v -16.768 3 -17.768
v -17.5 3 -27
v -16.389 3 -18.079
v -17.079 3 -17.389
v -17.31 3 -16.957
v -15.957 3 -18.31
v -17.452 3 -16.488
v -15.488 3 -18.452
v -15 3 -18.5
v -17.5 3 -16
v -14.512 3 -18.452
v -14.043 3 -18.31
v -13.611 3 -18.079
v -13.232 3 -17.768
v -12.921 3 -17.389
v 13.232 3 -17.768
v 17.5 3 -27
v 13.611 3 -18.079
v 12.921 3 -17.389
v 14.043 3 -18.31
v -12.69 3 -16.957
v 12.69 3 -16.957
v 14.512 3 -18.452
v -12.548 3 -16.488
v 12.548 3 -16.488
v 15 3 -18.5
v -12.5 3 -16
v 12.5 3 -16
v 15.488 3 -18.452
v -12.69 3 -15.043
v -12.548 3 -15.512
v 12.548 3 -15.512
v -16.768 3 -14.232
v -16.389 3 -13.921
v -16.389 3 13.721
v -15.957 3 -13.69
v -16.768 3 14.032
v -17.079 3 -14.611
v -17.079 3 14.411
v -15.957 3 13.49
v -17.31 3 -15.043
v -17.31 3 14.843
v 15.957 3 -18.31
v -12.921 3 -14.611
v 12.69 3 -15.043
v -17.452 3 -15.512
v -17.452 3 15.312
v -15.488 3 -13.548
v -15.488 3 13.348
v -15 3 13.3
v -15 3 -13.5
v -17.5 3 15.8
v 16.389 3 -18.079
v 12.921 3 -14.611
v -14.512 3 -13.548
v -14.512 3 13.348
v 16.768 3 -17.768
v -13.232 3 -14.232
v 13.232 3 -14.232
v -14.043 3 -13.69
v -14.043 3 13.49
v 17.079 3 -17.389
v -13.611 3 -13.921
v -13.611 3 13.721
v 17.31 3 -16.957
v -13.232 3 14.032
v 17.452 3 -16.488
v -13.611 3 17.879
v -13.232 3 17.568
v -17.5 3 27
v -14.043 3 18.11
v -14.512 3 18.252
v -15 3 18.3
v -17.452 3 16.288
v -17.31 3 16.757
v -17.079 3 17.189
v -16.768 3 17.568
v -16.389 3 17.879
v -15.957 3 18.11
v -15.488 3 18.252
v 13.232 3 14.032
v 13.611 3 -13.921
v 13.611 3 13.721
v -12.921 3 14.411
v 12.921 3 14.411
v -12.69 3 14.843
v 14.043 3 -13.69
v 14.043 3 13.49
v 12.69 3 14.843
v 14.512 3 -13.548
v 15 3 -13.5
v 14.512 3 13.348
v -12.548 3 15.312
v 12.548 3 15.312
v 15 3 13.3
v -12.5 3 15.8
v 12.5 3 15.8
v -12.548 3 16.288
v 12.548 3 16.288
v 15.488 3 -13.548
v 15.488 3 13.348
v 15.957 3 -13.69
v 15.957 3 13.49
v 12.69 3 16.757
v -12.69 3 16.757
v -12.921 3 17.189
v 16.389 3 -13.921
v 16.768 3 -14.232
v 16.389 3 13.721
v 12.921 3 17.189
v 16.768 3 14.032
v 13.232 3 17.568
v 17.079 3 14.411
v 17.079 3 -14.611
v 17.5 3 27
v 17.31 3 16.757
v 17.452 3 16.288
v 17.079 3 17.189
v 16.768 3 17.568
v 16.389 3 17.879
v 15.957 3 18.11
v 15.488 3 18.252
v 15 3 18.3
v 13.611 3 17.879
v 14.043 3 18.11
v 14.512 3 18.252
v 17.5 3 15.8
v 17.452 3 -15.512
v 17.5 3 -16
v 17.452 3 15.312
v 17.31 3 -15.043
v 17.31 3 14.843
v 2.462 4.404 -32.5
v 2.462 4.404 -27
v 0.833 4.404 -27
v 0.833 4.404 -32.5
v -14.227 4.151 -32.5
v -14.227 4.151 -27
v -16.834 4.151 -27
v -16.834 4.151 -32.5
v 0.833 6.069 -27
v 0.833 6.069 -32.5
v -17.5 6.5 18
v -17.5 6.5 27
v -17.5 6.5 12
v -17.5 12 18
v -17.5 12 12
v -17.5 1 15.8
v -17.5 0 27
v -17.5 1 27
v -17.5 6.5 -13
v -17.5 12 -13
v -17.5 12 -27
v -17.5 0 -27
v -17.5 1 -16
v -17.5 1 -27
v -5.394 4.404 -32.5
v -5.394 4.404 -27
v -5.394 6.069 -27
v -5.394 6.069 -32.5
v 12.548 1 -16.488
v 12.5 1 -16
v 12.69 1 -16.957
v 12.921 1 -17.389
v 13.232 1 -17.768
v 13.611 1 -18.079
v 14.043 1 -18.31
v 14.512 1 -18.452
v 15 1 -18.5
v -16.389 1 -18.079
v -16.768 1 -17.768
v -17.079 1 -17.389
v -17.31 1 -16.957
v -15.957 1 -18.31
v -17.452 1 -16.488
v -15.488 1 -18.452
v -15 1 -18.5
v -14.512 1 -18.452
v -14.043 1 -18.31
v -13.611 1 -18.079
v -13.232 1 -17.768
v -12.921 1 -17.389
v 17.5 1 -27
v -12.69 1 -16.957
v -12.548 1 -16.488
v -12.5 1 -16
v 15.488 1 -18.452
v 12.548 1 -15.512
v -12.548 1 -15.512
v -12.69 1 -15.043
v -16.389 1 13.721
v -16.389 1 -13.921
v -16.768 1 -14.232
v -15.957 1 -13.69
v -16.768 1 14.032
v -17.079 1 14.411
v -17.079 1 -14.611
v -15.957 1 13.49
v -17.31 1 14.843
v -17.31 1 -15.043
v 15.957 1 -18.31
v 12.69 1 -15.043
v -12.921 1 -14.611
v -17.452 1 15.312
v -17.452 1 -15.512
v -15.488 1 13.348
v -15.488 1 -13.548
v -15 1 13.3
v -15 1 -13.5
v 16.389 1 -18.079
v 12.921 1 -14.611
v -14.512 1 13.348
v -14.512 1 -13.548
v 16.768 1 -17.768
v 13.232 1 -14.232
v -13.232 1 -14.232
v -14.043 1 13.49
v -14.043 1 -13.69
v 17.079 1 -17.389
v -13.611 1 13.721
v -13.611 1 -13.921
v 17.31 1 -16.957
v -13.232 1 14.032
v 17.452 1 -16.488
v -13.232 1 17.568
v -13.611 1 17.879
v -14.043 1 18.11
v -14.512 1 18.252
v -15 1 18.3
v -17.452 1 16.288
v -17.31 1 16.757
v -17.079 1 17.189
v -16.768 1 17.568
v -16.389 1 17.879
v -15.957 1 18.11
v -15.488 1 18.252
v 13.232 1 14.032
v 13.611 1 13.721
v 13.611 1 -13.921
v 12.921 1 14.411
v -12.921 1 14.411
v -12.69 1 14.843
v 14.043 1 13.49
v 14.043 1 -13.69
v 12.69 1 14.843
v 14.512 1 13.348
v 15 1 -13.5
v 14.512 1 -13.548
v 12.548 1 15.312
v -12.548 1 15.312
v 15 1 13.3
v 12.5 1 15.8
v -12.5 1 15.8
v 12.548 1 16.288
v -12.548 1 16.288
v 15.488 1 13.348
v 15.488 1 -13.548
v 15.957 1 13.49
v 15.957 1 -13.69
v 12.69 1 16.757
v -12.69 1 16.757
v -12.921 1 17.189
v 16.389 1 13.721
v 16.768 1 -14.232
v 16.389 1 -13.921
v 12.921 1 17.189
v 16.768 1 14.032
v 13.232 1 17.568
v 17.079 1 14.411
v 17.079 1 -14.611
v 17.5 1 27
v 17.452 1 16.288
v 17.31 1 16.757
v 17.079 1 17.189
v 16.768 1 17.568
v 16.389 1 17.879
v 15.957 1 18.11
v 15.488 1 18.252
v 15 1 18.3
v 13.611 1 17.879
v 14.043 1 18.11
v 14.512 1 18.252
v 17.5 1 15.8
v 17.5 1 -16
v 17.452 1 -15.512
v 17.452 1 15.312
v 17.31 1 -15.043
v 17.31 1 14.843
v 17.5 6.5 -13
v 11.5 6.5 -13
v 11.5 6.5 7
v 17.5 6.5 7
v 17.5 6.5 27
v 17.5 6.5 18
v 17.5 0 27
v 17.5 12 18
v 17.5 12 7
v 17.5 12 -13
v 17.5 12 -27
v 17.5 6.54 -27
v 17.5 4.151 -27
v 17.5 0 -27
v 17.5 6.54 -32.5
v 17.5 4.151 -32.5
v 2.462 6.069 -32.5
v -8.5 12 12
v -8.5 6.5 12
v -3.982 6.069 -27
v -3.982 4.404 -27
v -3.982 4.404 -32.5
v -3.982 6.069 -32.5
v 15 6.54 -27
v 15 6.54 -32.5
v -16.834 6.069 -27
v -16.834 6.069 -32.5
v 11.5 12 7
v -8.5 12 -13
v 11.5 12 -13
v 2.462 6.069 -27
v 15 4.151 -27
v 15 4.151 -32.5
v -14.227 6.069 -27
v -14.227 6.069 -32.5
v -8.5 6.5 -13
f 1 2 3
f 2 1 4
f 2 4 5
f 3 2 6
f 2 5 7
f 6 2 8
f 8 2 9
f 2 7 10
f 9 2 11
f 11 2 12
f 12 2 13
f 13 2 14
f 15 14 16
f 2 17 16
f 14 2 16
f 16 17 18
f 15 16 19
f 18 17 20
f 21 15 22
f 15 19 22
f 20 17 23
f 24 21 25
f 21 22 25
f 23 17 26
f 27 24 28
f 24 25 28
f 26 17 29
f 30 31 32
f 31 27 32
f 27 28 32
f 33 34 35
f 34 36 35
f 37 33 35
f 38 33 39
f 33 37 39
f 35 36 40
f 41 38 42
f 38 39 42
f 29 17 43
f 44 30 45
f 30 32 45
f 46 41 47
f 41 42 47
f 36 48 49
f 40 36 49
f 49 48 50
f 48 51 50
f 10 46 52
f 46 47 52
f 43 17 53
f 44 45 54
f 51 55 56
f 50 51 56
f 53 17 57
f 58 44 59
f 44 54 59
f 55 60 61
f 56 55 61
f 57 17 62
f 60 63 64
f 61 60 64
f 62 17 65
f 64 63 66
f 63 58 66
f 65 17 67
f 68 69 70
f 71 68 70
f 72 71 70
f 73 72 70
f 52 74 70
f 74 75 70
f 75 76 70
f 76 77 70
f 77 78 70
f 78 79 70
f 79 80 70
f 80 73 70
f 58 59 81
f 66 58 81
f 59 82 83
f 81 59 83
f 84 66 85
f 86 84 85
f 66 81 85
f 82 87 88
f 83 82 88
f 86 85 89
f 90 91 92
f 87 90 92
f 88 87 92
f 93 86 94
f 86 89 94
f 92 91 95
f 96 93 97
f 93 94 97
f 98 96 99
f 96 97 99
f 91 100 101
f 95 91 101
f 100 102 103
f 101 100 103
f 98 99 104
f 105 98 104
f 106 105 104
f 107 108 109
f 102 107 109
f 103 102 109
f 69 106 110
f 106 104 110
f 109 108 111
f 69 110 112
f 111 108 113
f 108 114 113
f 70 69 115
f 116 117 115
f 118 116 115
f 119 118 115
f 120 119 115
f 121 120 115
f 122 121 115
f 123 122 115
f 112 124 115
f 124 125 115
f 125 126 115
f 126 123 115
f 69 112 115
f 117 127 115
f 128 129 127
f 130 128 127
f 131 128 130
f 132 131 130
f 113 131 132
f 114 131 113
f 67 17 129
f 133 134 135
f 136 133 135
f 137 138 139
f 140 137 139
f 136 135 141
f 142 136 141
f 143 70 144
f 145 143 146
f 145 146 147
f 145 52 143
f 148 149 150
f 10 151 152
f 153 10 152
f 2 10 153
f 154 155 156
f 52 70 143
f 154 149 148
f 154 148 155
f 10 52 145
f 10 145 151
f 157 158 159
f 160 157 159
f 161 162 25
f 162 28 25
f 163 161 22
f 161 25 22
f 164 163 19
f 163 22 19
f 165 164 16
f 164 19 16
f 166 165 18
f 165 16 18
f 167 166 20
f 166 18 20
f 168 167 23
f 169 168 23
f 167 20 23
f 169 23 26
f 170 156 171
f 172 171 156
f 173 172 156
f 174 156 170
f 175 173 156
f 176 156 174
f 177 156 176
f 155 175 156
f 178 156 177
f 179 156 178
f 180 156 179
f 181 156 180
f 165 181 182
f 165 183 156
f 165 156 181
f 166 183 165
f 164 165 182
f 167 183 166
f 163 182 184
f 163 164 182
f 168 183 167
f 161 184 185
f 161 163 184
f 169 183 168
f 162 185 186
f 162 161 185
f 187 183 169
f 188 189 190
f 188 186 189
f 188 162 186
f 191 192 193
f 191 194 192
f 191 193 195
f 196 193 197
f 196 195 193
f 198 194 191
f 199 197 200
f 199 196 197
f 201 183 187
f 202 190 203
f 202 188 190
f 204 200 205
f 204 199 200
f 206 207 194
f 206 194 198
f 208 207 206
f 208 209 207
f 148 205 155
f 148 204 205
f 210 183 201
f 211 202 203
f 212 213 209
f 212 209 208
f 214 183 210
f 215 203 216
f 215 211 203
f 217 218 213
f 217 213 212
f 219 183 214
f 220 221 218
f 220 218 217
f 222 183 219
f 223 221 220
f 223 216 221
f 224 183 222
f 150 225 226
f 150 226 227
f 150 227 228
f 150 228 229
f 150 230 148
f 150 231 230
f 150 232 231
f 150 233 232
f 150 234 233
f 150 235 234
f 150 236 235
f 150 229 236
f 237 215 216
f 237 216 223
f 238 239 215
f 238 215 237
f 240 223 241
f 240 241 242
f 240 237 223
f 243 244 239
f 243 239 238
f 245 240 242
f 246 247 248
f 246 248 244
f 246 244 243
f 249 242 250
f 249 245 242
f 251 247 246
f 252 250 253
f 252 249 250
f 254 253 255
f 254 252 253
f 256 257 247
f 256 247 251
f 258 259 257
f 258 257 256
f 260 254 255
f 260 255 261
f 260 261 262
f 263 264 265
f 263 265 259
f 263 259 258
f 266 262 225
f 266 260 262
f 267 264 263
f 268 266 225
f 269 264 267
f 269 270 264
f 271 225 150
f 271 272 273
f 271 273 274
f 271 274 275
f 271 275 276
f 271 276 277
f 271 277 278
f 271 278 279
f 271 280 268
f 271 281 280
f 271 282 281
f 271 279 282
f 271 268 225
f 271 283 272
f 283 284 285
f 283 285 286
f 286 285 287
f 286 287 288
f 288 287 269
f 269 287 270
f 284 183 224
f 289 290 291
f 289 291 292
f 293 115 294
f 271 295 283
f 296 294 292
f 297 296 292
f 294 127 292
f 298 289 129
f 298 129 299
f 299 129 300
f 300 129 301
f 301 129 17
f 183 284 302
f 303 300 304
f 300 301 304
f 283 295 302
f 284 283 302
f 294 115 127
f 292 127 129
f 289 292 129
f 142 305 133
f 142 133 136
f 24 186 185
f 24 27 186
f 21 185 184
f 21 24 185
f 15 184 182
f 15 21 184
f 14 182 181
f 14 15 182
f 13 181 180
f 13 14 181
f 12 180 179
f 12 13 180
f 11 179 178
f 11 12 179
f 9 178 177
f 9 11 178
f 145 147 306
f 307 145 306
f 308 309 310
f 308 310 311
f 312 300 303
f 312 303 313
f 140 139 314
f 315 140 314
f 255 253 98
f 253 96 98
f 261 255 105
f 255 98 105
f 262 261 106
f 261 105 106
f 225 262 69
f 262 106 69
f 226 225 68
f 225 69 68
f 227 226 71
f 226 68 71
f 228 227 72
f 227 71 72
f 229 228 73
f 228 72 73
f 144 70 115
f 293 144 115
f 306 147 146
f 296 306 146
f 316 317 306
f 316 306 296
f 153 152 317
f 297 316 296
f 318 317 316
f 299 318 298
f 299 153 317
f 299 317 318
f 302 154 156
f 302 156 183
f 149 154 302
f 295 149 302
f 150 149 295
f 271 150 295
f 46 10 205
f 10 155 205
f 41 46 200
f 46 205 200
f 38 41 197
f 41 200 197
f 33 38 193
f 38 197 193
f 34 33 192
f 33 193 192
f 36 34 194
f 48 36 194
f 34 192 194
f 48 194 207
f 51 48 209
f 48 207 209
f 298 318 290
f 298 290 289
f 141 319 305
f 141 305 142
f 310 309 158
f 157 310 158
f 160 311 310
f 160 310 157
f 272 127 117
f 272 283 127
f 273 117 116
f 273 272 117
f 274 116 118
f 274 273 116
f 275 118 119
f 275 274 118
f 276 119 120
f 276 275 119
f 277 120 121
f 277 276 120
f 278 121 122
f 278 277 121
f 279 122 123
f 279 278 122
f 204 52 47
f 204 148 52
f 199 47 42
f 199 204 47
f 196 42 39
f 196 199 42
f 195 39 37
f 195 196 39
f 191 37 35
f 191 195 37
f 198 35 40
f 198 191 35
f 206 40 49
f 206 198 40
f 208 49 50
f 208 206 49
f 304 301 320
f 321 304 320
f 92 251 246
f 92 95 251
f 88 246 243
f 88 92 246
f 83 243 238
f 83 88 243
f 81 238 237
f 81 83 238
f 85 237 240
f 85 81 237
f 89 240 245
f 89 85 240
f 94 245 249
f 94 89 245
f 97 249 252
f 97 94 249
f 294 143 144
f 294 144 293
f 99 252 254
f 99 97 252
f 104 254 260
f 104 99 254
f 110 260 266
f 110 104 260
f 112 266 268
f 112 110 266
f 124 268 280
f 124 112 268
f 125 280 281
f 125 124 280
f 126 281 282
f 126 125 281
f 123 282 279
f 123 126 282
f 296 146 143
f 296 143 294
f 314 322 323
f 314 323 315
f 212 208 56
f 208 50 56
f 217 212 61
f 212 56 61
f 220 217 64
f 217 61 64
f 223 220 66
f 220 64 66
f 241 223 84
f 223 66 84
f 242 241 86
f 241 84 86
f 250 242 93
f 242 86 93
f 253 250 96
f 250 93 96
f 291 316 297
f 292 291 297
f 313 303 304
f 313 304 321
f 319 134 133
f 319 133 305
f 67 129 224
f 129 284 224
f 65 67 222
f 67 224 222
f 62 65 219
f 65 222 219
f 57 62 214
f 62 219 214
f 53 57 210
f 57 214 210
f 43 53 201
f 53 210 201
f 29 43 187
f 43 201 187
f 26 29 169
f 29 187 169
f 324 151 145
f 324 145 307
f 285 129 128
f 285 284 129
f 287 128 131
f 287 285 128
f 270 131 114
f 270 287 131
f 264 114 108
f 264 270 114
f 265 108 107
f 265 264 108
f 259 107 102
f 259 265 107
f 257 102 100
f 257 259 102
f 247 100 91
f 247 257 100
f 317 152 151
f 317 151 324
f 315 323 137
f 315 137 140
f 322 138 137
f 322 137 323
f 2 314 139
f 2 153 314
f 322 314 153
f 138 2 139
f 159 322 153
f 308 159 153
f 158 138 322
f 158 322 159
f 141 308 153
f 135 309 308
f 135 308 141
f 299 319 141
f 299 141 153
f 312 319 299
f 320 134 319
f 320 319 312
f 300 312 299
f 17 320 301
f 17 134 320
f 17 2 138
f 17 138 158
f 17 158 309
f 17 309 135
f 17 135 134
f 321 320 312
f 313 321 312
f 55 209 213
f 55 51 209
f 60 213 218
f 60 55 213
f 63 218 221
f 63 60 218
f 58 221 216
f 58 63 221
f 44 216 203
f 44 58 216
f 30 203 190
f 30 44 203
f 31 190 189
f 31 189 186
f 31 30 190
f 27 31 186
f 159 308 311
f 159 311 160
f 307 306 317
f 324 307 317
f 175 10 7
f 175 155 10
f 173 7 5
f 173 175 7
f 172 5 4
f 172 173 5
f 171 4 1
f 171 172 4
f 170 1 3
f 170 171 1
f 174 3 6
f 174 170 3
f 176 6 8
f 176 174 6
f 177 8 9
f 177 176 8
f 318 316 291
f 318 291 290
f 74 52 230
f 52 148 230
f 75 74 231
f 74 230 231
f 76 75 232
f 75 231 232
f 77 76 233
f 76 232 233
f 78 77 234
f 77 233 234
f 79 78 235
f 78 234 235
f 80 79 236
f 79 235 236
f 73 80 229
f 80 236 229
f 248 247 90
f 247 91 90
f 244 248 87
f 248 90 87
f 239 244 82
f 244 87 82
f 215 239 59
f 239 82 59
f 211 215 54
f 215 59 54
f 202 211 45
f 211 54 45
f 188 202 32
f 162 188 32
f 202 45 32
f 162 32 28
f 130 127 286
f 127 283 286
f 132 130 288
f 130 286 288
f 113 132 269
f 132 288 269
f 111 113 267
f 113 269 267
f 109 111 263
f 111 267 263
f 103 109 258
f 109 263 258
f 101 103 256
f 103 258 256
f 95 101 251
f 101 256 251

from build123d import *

# Parameters (mm, degrees)
SKETCH1_W               = 35
SKETCH1_H               = 54
BOSS_EXTRUDE1_DEPTH     = 12
SKETCH2_W               = 35
SKETCH2_H               = 9
SKETCH2_W_2             = 9
SKETCH2_H_2             = 25
SKETCH2_W_3             = 6
SKETCH2_H_3             = 20
CUT_EXTRUDE1_DEPTH      = 5.5
CUT_EXTRUDE2_DEPTH      = 59.019393309
CUT_EXTRUDE2_DEPTH_BACK = 59.019393309
SKETCH3_W               = 25
SKETCH3_H               = 2
CUT_EXTRUDE3_DEPTH      = 46.803929962
CUT_EXTRUDE3_DEPTH_BACK = 46.803929962
SKETCH4_W               = 8.5
SKETCH4_H               = 2
SKETCH4_W_2             = 26.8
SKETCH4_W_3             = 8.7
FILLET1_R               = 2.5
SKETCH5_W               = 2.5
SKETCH5_H               = 2.389297353
SKETCH5_W_2             = 1.629066377
SKETCH5_H_2             = 1.665267852
SKETCH5_W_3             = 1.411857527
SKETCH5_W_4             = 2.606506203
SKETCH5_H_3             = 1.918678177
BOSS_EXTRUDE2_DEPTH     = 5.5


with BuildPart() as part:
    # Sketch1 → Boss-Extrude1 (new body)
    with BuildSketch(Plane(origin=(0, 0, 0), x_dir=(1, 0, 0), z_dir=(0, 1, 0))):
        Rectangle(SKETCH1_W, SKETCH1_H)
    extrude(amount=BOSS_EXTRUDE1_DEPTH)

    # Sketch2 → Cut-Extrude1 (cut)
    with BuildSketch(Plane(origin=(0, 12, 0), x_dir=(1, 0, 0), z_dir=(0, 1, 0))):
        with Locations((0, -22.5)):
            Rectangle(SKETCH2_W, SKETCH2_H)
        with Locations((-13, 0.5)):
            Rectangle(SKETCH2_W_2, SKETCH2_H_2)
        with Locations((14.5, 3)):
            Rectangle(SKETCH2_W_3, SKETCH2_H_3)
    extrude(amount=-CUT_EXTRUDE1_DEPTH, mode=Mode.SUBTRACT)

    # Sketch3 → Cut-Extrude2 (cut, two sides: drawn at the far end of the back side and taken through both)
    with BuildSketch(Plane(origin=(0, 0, -27), x_dir=(-1, 0, 0), z_dir=(0, 0, -1)).offset(-CUT_EXTRUDE2_DEPTH_BACK)):
        with Locations((0, 2)):
            Rectangle(SKETCH3_W, SKETCH3_H)
    extrude(amount=CUT_EXTRUDE2_DEPTH + CUT_EXTRUDE2_DEPTH_BACK, mode=Mode.SUBTRACT)

    # Sketch4 → Cut-Extrude3 (cut, two sides: drawn at the far end of the back side and taken through both)
    with BuildSketch(Plane.ZY.offset(17.5).offset(-CUT_EXTRUDE3_DEPTH_BACK)):
        with Locations((-22.75, 2)):
            Rectangle(SKETCH4_W, SKETCH4_H)
        with Locations((-0.1, 2)):
            Rectangle(SKETCH4_W_2, SKETCH4_H)
        with Locations((22.65, 2)):
            Rectangle(SKETCH4_W_3, SKETCH4_H)
    extrude(amount=CUT_EXTRUDE3_DEPTH + CUT_EXTRUDE3_DEPTH_BACK, mode=Mode.SUBTRACT)

    # Fillet1
    fillet1_edges = [part.edges().sort_by_distance(p)[0] for p in [
        (12.5, 2, -13.5),
        (12.5, 2, -18.5),
        (17.5, 2, -18.5),
        (17.5, 2, -13.5),
        (12.5, 2, 13.3),
        (12.5, 2, 18.3),
        (17.5, 2, 13.3),
        (17.5, 2, 18.3),
        (-12.5, 2, 13.3),
        (-12.5, 2, 18.3),
        (-12.5, 2, -18.5),
        (-12.5, 2, -13.5),
        (-17.5, 2, 13.3),
        (-17.5, 2, 18.3),
        (-17.5, 2, -18.5),
        (-17.5, 2, -13.5),
    ]]
    fillet(fillet1_edges, radius=FILLET1_R - 0.0001)  # a hair under: the kernel refuses the full size

    # Sketch5 → Boss-Extrude2 (add)
    with BuildSketch(Plane(origin=(0, 0, -27), x_dir=(-1, 0, 0), z_dir=(0, 0, -1))):
        with Locations((-16.25, 5.345369084)):
            Rectangle(SKETCH5_W, SKETCH5_H)
        with Locations((-1.647167115, 5.236764658)):
            Rectangle(SKETCH5_W_2, SKETCH5_H_2)
        with Locations((4.688091019, 5.236764658)):
            Rectangle(SKETCH5_W_3, SKETCH5_H_2)
        with Locations((15.530432797, 5.110059495)):
            Rectangle(SKETCH5_W_4, SKETCH5_H_3)
    extrude(amount=BOSS_EXTRUDE2_DEPTH)


solid = part.part
